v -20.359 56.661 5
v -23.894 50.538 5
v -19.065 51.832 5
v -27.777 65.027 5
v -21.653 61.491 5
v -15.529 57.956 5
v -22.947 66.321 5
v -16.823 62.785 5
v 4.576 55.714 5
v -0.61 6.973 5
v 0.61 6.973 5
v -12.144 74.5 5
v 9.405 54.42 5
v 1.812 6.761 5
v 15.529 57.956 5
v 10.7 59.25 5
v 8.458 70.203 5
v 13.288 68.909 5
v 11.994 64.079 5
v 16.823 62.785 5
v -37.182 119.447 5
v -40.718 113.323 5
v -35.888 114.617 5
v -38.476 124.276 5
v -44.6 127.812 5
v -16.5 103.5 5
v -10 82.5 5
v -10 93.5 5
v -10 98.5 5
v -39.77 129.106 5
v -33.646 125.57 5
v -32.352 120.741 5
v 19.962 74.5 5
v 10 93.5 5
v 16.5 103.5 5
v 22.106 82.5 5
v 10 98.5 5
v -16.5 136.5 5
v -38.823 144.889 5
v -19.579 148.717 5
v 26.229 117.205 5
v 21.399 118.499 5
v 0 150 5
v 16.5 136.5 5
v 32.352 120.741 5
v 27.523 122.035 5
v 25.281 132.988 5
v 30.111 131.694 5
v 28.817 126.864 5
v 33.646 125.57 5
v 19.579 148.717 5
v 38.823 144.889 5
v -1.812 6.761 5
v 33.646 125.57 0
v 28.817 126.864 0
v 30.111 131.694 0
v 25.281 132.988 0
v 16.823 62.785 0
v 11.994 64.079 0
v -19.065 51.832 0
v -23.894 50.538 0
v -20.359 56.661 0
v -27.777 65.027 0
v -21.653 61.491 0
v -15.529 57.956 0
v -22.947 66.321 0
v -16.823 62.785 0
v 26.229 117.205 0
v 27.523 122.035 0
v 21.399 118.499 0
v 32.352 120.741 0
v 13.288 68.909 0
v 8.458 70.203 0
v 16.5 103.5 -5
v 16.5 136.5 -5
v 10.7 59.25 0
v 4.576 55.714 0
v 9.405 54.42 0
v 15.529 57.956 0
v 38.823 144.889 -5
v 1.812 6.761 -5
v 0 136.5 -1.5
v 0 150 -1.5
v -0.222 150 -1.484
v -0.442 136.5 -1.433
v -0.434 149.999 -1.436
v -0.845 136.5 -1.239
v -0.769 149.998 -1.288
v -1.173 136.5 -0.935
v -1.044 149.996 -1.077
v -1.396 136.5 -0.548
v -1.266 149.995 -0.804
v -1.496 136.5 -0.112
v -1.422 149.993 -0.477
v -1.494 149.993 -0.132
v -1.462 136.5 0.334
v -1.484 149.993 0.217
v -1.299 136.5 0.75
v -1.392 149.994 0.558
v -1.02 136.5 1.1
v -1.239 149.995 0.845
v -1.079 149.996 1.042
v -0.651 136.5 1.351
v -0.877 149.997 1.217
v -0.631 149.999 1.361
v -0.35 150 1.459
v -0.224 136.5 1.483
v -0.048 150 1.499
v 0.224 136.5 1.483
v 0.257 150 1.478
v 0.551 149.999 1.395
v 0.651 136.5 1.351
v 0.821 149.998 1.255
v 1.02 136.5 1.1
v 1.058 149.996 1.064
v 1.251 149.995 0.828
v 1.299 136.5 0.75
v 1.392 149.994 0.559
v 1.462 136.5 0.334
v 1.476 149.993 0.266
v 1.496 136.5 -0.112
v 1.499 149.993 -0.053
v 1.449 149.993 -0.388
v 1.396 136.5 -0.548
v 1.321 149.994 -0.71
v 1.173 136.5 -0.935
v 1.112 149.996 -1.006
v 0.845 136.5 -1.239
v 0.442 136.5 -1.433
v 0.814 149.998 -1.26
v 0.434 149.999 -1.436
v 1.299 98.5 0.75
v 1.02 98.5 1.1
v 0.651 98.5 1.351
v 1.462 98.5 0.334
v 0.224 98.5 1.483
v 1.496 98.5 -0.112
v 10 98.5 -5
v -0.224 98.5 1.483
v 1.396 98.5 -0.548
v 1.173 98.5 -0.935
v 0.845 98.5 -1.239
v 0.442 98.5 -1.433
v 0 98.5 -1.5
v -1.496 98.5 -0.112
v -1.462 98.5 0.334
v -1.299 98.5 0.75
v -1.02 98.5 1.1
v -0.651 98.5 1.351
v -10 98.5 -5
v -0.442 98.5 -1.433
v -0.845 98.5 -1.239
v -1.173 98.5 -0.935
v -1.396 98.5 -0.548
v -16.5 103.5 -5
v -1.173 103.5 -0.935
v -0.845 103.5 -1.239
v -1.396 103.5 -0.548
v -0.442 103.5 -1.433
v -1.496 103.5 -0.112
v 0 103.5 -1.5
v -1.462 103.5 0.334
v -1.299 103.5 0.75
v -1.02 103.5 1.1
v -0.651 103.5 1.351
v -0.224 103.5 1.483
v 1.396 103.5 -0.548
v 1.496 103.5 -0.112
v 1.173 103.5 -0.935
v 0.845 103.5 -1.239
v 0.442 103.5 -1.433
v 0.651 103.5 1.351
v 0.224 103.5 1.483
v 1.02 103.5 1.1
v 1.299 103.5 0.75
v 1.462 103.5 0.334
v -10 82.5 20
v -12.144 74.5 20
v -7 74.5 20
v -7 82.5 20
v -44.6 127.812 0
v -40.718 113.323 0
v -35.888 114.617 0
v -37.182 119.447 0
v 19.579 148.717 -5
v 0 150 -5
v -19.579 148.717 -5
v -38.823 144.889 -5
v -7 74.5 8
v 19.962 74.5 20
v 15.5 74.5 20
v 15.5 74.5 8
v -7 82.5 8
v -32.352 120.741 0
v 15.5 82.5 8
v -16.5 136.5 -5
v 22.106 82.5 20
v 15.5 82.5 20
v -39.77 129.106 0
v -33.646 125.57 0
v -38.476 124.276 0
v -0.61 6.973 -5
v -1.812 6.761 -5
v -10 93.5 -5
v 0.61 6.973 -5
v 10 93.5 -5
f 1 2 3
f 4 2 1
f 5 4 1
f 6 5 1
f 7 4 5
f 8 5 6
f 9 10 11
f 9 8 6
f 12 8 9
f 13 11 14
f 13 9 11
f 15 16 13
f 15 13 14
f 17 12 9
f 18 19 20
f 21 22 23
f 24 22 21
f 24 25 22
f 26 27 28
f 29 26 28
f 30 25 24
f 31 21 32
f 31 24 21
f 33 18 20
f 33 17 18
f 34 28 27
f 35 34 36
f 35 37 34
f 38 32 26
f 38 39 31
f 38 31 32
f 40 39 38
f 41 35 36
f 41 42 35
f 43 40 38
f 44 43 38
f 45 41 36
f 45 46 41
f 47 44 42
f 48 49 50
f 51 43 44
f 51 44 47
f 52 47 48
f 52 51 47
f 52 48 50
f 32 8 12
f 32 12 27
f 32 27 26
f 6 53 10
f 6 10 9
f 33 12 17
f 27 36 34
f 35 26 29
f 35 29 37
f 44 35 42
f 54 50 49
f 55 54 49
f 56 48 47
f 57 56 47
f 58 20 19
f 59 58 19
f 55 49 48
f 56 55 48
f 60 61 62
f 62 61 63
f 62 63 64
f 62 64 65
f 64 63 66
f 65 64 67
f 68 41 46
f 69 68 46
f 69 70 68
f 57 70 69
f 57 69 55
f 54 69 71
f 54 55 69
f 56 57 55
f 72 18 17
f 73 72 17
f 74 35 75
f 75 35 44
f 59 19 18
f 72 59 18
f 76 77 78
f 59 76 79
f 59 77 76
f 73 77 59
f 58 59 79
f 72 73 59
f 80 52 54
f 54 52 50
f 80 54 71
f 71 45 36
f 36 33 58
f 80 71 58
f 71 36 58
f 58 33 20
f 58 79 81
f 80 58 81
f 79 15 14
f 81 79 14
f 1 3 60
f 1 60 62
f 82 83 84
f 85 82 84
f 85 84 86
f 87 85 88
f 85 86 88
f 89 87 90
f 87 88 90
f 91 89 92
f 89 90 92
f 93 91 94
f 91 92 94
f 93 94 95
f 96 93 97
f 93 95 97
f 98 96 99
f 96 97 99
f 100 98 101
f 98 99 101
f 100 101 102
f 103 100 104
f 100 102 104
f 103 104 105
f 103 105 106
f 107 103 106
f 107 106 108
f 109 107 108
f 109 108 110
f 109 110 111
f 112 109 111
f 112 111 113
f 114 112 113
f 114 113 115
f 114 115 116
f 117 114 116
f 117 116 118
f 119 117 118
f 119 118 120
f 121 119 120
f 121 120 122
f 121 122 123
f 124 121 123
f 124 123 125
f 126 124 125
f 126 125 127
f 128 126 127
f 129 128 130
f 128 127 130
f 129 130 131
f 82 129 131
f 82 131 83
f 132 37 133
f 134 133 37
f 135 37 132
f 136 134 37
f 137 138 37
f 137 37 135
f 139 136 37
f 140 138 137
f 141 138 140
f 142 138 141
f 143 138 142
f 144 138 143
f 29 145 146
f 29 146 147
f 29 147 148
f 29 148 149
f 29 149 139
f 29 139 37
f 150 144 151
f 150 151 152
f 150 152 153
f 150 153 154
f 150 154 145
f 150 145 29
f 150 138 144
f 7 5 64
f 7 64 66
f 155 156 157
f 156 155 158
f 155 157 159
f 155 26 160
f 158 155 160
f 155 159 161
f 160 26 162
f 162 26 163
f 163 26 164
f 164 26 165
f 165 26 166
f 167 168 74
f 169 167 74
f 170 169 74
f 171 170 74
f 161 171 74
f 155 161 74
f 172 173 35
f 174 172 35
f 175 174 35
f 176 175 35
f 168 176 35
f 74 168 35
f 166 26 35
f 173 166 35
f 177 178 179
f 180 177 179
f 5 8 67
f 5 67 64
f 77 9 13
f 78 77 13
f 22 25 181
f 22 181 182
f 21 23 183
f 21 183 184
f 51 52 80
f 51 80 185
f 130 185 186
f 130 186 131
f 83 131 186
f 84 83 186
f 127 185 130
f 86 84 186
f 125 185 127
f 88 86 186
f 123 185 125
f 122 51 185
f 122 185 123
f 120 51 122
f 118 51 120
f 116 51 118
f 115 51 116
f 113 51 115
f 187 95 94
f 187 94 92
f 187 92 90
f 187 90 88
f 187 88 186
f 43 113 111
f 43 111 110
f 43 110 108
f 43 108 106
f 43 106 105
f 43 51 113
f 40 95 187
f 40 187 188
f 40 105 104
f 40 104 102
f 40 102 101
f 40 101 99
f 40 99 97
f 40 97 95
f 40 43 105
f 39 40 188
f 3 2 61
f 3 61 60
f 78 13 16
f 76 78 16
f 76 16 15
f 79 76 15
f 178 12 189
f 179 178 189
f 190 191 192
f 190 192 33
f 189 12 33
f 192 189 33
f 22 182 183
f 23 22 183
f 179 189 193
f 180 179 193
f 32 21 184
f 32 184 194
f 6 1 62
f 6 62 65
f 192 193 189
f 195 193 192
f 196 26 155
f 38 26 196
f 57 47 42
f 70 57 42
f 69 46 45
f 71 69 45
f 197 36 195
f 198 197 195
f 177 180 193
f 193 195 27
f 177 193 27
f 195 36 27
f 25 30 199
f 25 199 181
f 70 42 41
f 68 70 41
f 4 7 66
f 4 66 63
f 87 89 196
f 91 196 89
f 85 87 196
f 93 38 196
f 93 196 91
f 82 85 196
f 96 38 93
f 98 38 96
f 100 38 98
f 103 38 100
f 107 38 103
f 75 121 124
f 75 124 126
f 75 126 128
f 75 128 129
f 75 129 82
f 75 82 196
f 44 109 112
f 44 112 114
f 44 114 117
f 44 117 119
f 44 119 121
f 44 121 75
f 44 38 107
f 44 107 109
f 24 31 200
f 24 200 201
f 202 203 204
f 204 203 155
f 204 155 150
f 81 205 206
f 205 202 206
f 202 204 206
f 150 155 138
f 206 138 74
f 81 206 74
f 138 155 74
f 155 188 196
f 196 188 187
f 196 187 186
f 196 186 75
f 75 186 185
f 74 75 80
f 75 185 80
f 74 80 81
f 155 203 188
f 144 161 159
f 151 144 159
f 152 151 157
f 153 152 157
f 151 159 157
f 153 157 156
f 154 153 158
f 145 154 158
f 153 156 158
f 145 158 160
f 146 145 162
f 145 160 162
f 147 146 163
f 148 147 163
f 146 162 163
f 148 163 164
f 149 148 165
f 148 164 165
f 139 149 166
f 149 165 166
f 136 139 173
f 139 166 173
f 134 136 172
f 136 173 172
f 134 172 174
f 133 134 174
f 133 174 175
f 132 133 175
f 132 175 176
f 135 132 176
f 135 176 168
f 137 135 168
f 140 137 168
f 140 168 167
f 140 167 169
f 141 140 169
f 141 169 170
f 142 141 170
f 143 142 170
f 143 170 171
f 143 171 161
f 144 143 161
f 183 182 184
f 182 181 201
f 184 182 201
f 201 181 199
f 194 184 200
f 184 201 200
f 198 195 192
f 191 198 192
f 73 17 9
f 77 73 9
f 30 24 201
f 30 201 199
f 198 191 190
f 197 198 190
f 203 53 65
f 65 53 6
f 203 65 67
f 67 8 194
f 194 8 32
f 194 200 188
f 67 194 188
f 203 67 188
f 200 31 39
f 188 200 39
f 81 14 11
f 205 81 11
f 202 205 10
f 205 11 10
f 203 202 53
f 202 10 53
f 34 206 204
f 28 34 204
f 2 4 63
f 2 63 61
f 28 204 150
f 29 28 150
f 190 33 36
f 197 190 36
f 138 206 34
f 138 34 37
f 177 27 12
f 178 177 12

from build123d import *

# Parameters (mm, degrees)
SKETCH1_R           = 150
SKETCH1_W           = 33
SKETCH1_H           = 33
BOSS_EXTRUDE1_DEPTH = 5
SKETCH4_R           = 1.5
CUT_EXTRUDE1_DEPTH  = 55
CIRPATTERN1_COUNT   = 12
CUT_EXTRUDE2_REACH  = 214.368
SKETCH5_W           = 20
SKETCH5_H           = 5
SKETCH5_W_2         = 5
SKETCH5_H_2         = 20
CUT_EXTRUDE3_DEPTH  = 10
BOSS_EXTRUDE2_DEPTH = 5
CUT_EXTRUDE4_DEPTH  = 5
BOSS_EXTRUDE3_DEPTH = 15
SKETCH11_W          = 22.5
SKETCH11_H          = 8
BOSS_EXTRUDE4_DEPTH = 3


with BuildPart() as part:
    # Sketch1 → Boss-Extrude1 (new, symmetric)
    with BuildSketch(Plane.XY):
        Circle(SKETCH1_R)
        Polygon((37.460580838, 97.883629292), (66.039419162, 81.383629292), (82.539419162, 109.962467617), (53.960580838, 126.462467617), align=None, mode=Mode.SUBTRACT)
        with Locations((0, 120)):
            Rectangle(SKETCH1_W, SKETCH1_H, mode=Mode.SUBTRACT)
        Polygon((81.383629292, 66.039419162), (97.883629292, 37.460580838), (126.462467617, 53.960580838), (109.962467617, 82.539419162), align=None, mode=Mode.SUBTRACT)
        with Locations((120, 0)):
            Rectangle(SKETCH1_W, SKETCH1_H, mode=Mode.SUBTRACT)
        Polygon((97.883629292, -37.460580838), (81.383629292, -66.039419162), (109.962467617, -82.539419162), (126.462467617, -53.960580838), align=None, mode=Mode.SUBTRACT)
        Polygon((66.039419162, -81.383629292), (37.460580838, -97.883629292), (53.960580838, -126.462467617), (82.539419162, -109.962467617), align=None, mode=Mode.SUBTRACT)
        with Locations((0, -120)):
            Rectangle(SKETCH1_W, SKETCH1_H, mode=Mode.SUBTRACT)
        Polygon((-37.460580838, -97.883629292), (-66.039419162, -81.383629292), (-82.539419162, -109.962467617), (-53.960580838, -126.462467617), align=None, mode=Mode.SUBTRACT)
        Polygon((-81.383629292, -66.039419162), (-97.883629292, -37.460580838), (-126.462467617, -53.960580838), (-109.962467617, -82.539419162), align=None, mode=Mode.SUBTRACT)
        with Locations((-120, 0)):
            Rectangle(SKETCH1_W, SKETCH1_H, mode=Mode.SUBTRACT)
        Polygon((-97.883629292, 37.460580838), (-81.383629292, 66.039419162), (-109.962467617, 82.539419162), (-126.462467617, 53.960580838), align=None, mode=Mode.SUBTRACT)
        Polygon((-66.039419162, 81.383629292), (-37.460580838, 97.883629292), (-53.960580838, 126.462467617), (-82.539419162, 109.962467617), align=None, mode=Mode.SUBTRACT)
    extrude(amount=BOSS_EXTRUDE1_DEPTH, both=True)

    # Sketch4 → Cut-Extrude1 (cut)
    with BuildSketch(Plane(origin=(0, -150, 0), x_dir=(-1, 0, 0), z_dir=(0, -1, 0))):
        Circle(SKETCH4_R)
    cut_extrude1 = extrude(amount=-CUT_EXTRUDE1_DEPTH, mode=Mode.SUBTRACT)

    # CirPattern1: Cut-Extrude1 ×12 about axis
    cirpattern1_axis = Axis((0, 0, 5), (0, 0, -1))
    for i in range(1, CIRPATTERN1_COUNT):
        add(cut_extrude1.rotate(cirpattern1_axis, i * 360 / CIRPATTERN1_COUNT), mode=Mode.SUBTRACT)

    # Sketch5 → Cut-Extrude2 (cut, up to next)
    with BuildSketch(Plane(origin=(0, 0, -5), x_dir=(-1, 0, 0), z_dir=(0, 0, -1)), mode=Mode.PRIVATE) as cut_extrude2_sk1:
        Polygon((38.089745962, 85.973375254), (55.410254038, 75.973375254), (57.910254038, 80.303502273), (40.589745962, 90.303502273), align=None)
    cut_extrude2_tool1 = extrude(cut_extrude2_sk1.sketch, amount=-CUT_EXTRUDE2_REACH, mode=Mode.PRIVATE) & part.part
    # Sketch5 → Cut-Extrude2 (cut, up to next)
    with BuildSketch(Plane(origin=(0, 0, -5), x_dir=(-1, 0, 0), z_dir=(0, 0, -1)), mode=Mode.PRIVATE) as cut_extrude2_sk2:
        with Locations((0, 96)):
            Rectangle(SKETCH5_W, SKETCH5_H)
    cut_extrude2_tool2 = extrude(cut_extrude2_sk2.sketch, amount=-CUT_EXTRUDE2_REACH, mode=Mode.PRIVATE) & part.part
    # Sketch5 → Cut-Extrude2 (cut, up to next)
    with BuildSketch(Plane(origin=(0, 0, -5), x_dir=(-1, 0, 0), z_dir=(0, 0, -1)), mode=Mode.PRIVATE) as cut_extrude2_sk3:
        Polygon((75.973375254, 55.410254038), (85.973375254, 38.089745962), (90.303502273, 40.589745962), (80.303502273, 57.910254038), align=None)
    cut_extrude2_tool3 = extrude(cut_extrude2_sk3.sketch, amount=-CUT_EXTRUDE2_REACH, mode=Mode.PRIVATE) & part.part
    # Sketch5 → Cut-Extrude2 (cut, up to next)
    with BuildSketch(Plane(origin=(0, 0, -5), x_dir=(-1, 0, 0), z_dir=(0, 0, -1)), mode=Mode.PRIVATE) as cut_extrude2_sk4:
        with Locations((96, 0)):
            Rectangle(SKETCH5_W_2, SKETCH5_H_2)
    cut_extrude2_tool4 = extrude(cut_extrude2_sk4.sketch, amount=-CUT_EXTRUDE2_REACH, mode=Mode.PRIVATE) & part.part
    # Sketch5 → Cut-Extrude2 (cut, up to next)
    with BuildSketch(Plane(origin=(0, 0, -5), x_dir=(-1, 0, 0), z_dir=(0, 0, -1)), mode=Mode.PRIVATE) as cut_extrude2_sk5:
        Polygon((85.973375254, -38.089745962), (75.973375254, -55.410254038), (80.303502273, -57.910254038), (90.303502273, -40.589745962), align=None)
    cut_extrude2_tool5 = extrude(cut_extrude2_sk5.sketch, amount=-CUT_EXTRUDE2_REACH, mode=Mode.PRIVATE) & part.part
    # Sketch5 → Cut-Extrude2 (cut, up to next)
    with BuildSketch(Plane(origin=(0, 0, -5), x_dir=(-1, 0, 0), z_dir=(0, 0, -1)), mode=Mode.PRIVATE) as cut_extrude2_sk6:
        Polygon((55.410254038, -75.973375254), (38.089745962, -85.973375254), (40.589745962, -90.303502273), (57.910254038, -80.303502273), align=None)
    cut_extrude2_tool6 = extrude(cut_extrude2_sk6.sketch, amount=-CUT_EXTRUDE2_REACH, mode=Mode.PRIVATE) & part.part
    # Sketch5 → Cut-Extrude2 (cut, up to next)
    with BuildSketch(Plane(origin=(0, 0, -5), x_dir=(-1, 0, 0), z_dir=(0, 0, -1)), mode=Mode.PRIVATE) as cut_extrude2_sk7:
        with Locations((0, -96)):
            Rectangle(SKETCH5_W, SKETCH5_H)
    cut_extrude2_tool7 = extrude(cut_extrude2_sk7.sketch, amount=-CUT_EXTRUDE2_REACH, mode=Mode.PRIVATE) & part.part
    # Sketch5 → Cut-Extrude2 (cut, up to next)
    with BuildSketch(Plane(origin=(0, 0, -5), x_dir=(-1, 0, 0), z_dir=(0, 0, -1)), mode=Mode.PRIVATE) as cut_extrude2_sk8:
        Polygon((-38.089745962, -85.973375254), (-55.410254038, -75.973375254), (-57.910254038, -80.303502273), (-40.589745962, -90.303502273), align=None)
    cut_extrude2_tool8 = extrude(cut_extrude2_sk8.sketch, amount=-CUT_EXTRUDE2_REACH, mode=Mode.PRIVATE) & part.part
    # Sketch5 → Cut-Extrude2 (cut, up to next)
    with BuildSketch(Plane(origin=(0, 0, -5), x_dir=(-1, 0, 0), z_dir=(0, 0, -1)), mode=Mode.PRIVATE) as cut_extrude2_sk9:
        Polygon((-75.973375254, -55.410254038), (-85.973375254, -38.089745962), (-90.303502273, -40.589745962), (-80.303502273, -57.910254038), align=None)
    cut_extrude2_tool9 = extrude(cut_extrude2_sk9.sketch, amount=-CUT_EXTRUDE2_REACH, mode=Mode.PRIVATE) & part.part
    # Sketch5 → Cut-Extrude2 (cut, up to next)
    with BuildSketch(Plane(origin=(0, 0, -5), x_dir=(-1, 0, 0), z_dir=(0, 0, -1)), mode=Mode.PRIVATE) as cut_extrude2_sk10:
        with Locations((-96, 0)):
            Rectangle(SKETCH5_W_2, SKETCH5_H_2)
    cut_extrude2_tool10 = extrude(cut_extrude2_sk10.sketch, amount=-CUT_EXTRUDE2_REACH, mode=Mode.PRIVATE) & part.part
    # Sketch5 → Cut-Extrude2 (cut, up to next)
    with BuildSketch(Plane(origin=(0, 0, -5), x_dir=(-1, 0, 0), z_dir=(0, 0, -1)), mode=Mode.PRIVATE) as cut_extrude2_sk11:
        Polygon((-85.973375254, 38.089745962), (-75.973375254, 55.410254038), (-80.303502273, 57.910254038), (-90.303502273, 40.589745962), align=None)
    cut_extrude2_tool11 = extrude(cut_extrude2_sk11.sketch, amount=-CUT_EXTRUDE2_REACH, mode=Mode.PRIVATE) & part.part
    # Sketch5 → Cut-Extrude2 (cut, up to next)
    with BuildSketch(Plane(origin=(0, 0, -5), x_dir=(-1, 0, 0), z_dir=(0, 0, -1)), mode=Mode.PRIVATE) as cut_extrude2_sk12:
        Polygon((-55.410254038, 75.973375254), (-38.089745962, 85.973375254), (-40.589745962, 90.303502273), (-57.910254038, 80.303502273), align=None)
    cut_extrude2_tool12 = extrude(cut_extrude2_sk12.sketch, amount=-CUT_EXTRUDE2_REACH, mode=Mode.PRIVATE) & part.part
    add(cut_extrude2_tool1.solids().sort_by_distance((-48, 83.138439, -5))[0], mode=Mode.SUBTRACT)
    add(cut_extrude2_tool2.solids().sort_by_distance((0, 96, -5))[0], mode=Mode.SUBTRACT)
    add(cut_extrude2_tool3.solids().sort_by_distance((-83.138439, 48, -5))[0], mode=Mode.SUBTRACT)
    add(cut_extrude2_tool4.solids().sort_by_distance((-96, 0, -5))[0], mode=Mode.SUBTRACT)
    add(cut_extrude2_tool5.solids().sort_by_distance((-83.138439, -48, -5))[0], mode=Mode.SUBTRACT)
    add(cut_extrude2_tool6.solids().sort_by_distance((-48, -83.138439, -5))[0], mode=Mode.SUBTRACT)
    add(cut_extrude2_tool7.solids().sort_by_distance((0, -96, -5))[0], mode=Mode.SUBTRACT)
    add(cut_extrude2_tool8.solids().sort_by_distance((48, -83.138439, -5))[0], mode=Mode.SUBTRACT)
    add(cut_extrude2_tool9.solids().sort_by_distance((83.138439, -48, -5))[0], mode=Mode.SUBTRACT)
    add(cut_extrude2_tool10.solids().sort_by_distance((96, 0, -5))[0], mode=Mode.SUBTRACT)
    add(cut_extrude2_tool11.solids().sort_by_distance((83.138439, 48, -5))[0], mode=Mode.SUBTRACT)
    add(cut_extrude2_tool12.solids().sort_by_distance((48, 83.138439, -5))[0], mode=Mode.SUBTRACT)

    # Sketch6 → Cut-Extrude3 (cut)
    with BuildSketch(Plane.XY.offset(5)):
        with BuildLine():
            Line((38.822856765, 144.888873943), (1.811733316, 6.761480784))
            ThreePointArc((1.811733316, 6.761480784), (0, 7), (-1.811733316, 6.761480784))
            Line((-1.811733316, 6.761480784), (-38.822856765, 144.888873943))
            ThreePointArc((-38.822856765, 144.888873943), (0, -150), (38.822856765, 144.888873943))
        make_face()
    extrude(amount=-CUT_EXTRUDE3_DEPTH, mode=Mode.SUBTRACT)

    # Sketch7 → Boss-Extrude2 (add)
    with BuildSketch(Plane.XY.offset(5)):
        Polygon((-20.358771838, 56.661454352), (-15.529142706, 57.955549577), (-16.823237932, 62.785178709), (-21.652867063, 61.491083483), (-22.946962289, 66.320712615), (-27.77659142, 65.026617389), (-23.894305744, 50.537729995), (-19.064676612, 51.83182522), align=None)
        Polygon((-37.182009769, 119.446633061), (-32.352380638, 120.740728286), (-33.646475863, 125.570357418), (-38.476104995, 124.276262192), (-39.77020022, 129.105891324), (-44.599829352, 127.811796098), (-40.717543675, 113.322908704), (-35.887914544, 114.617003929), align=None)
    extrude(amount=-BOSS_EXTRUDE2_DEPTH)

    # Sketch9 → Cut-Extrude4 (cut)
    with BuildSketch(Plane.XY.offset(5)):
        Polygon((32.352380638, 120.740728286), (33.646475863, 125.570357418), (28.816846732, 126.864452643), (30.110941957, 131.694081775), (25.281312826, 132.988177), (21.399027149, 118.499289606), (26.228656281, 117.20519438), (27.522751506, 122.034823512), align=None)
        Polygon((15.529142706, 57.955549577), (16.823237932, 62.785178709), (11.9936088, 64.079273934), (13.287704026, 68.908903066), (8.458074894, 70.202998291), (4.575789218, 55.714110897), (9.405418349, 54.420015671), (10.699513575, 59.249644803), align=None)
    extrude(amount=-CUT_EXTRUDE4_DEPTH, mode=Mode.SUBTRACT)

    # Sketch10 → Boss-Extrude3 (add)
    with BuildSketch(Plane.XY.offset(5)):
        Polygon((-7, 82.5), (-10, 82.5), (-12.143593539, 74.5), (-7, 74.5), align=None)
        Polygon((22.105808376, 82.5), (15.5, 82.5), (15.5, 74.5), (19.962214836, 74.5), align=None)
    extrude(amount=BOSS_EXTRUDE3_DEPTH)

    # Sketch11 → Boss-Extrude4 (add)
    with BuildSketch(Plane.XY.offset(5)):
        with Locations((4.25, 78.5)):
            Rectangle(SKETCH11_W, SKETCH11_H)
    extrude(amount=BOSS_EXTRUDE4_DEPTH)


solid = part.part
